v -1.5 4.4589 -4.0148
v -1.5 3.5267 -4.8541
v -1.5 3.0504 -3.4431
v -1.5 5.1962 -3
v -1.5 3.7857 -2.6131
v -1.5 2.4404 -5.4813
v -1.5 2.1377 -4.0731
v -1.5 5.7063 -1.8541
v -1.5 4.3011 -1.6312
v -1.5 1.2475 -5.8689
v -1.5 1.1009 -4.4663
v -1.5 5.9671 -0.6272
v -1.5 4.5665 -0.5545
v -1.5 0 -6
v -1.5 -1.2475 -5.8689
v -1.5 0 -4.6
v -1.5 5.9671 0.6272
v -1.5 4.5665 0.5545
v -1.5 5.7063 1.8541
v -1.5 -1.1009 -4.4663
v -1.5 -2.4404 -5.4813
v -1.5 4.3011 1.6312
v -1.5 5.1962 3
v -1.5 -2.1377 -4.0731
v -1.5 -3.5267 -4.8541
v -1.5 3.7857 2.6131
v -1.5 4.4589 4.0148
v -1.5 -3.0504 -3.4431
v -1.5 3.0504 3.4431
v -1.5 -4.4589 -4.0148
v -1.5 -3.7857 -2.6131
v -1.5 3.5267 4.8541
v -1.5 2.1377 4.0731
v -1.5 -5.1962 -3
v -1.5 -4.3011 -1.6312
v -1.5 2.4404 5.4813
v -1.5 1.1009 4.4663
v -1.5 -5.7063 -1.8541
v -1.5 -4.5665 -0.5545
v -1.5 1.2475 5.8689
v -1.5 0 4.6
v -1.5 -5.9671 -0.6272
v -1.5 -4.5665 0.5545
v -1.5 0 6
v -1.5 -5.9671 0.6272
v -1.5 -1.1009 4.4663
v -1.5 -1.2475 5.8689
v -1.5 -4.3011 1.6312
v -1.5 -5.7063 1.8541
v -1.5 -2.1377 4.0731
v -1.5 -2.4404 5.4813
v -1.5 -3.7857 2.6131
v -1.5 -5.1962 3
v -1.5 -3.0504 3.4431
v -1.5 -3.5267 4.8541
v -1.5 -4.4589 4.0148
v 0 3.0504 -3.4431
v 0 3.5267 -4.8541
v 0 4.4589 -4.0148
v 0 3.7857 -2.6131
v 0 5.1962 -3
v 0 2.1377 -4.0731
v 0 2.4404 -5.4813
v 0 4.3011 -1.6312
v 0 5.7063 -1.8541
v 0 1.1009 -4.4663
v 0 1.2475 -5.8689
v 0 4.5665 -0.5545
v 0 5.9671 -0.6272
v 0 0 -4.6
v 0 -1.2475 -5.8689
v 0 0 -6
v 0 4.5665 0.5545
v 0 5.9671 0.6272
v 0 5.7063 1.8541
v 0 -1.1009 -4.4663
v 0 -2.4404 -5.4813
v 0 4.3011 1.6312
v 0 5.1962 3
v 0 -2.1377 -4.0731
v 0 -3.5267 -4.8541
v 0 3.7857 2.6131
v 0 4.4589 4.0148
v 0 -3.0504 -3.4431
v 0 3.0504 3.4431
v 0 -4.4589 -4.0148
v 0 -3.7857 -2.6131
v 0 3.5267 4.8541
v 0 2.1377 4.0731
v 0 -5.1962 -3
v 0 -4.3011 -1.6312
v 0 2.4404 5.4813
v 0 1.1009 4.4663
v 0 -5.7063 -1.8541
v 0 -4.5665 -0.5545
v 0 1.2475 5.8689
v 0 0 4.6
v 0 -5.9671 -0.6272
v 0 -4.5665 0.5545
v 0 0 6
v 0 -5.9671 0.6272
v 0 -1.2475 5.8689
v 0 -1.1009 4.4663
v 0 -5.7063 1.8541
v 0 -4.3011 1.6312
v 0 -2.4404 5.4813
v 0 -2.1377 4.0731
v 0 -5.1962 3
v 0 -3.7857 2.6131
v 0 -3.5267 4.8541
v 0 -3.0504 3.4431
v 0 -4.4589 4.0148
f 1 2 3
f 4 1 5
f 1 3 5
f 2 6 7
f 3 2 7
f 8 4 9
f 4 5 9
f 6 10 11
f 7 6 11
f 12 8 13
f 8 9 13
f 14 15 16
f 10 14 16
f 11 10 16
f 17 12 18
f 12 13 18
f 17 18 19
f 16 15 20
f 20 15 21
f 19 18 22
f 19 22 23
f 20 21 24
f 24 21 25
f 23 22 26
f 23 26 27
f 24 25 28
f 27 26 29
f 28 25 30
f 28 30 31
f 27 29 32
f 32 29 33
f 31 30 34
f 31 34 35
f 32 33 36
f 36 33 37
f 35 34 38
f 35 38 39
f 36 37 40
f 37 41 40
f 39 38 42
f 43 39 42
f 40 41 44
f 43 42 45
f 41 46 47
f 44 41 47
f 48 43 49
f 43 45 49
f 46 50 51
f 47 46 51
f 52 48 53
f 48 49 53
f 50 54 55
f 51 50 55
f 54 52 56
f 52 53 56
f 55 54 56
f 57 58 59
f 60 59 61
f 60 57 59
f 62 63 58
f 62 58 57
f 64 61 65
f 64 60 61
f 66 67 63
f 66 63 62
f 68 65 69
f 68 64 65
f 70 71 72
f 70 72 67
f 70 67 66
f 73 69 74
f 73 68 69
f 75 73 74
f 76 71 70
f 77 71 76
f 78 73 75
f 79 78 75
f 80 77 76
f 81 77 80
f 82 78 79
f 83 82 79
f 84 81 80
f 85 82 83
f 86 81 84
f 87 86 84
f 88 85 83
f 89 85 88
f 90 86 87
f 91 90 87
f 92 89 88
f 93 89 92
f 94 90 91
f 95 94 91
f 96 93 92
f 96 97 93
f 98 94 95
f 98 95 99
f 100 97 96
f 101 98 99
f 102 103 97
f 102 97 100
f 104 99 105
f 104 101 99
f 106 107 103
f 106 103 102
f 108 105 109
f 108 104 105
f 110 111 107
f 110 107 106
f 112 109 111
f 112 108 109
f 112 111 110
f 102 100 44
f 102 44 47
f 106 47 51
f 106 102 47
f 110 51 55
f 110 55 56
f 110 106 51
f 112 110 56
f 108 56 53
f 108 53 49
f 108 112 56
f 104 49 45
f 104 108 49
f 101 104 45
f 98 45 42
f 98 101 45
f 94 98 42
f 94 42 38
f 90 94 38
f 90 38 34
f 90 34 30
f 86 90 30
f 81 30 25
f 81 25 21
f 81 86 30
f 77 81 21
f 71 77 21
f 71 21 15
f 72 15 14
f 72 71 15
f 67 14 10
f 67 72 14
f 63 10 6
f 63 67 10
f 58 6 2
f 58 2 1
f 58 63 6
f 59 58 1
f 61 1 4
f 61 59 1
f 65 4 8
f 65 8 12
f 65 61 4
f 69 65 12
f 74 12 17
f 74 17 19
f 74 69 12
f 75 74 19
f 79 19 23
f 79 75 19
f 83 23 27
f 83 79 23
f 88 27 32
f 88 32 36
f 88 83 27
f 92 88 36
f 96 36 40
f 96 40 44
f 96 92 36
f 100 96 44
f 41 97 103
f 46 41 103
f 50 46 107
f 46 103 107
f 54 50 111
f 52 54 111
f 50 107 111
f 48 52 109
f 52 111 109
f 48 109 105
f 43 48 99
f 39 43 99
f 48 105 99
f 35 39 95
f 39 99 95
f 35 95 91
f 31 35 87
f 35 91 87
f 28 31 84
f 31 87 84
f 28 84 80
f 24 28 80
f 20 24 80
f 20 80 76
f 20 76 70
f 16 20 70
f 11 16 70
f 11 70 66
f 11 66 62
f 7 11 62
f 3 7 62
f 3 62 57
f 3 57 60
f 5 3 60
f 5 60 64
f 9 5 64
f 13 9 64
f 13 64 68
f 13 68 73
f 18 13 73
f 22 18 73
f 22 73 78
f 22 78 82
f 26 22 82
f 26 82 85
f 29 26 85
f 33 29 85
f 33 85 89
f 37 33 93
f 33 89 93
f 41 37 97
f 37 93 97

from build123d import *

# Parameters (mm, degrees)
F0_R     = 6
F1_DEPTH = 1.5
F2_R     = 4.6
F3_DEPTH = 1.501
F4_ANGLE = 90
F6_ANGLE = 90


with BuildPart() as f1:
    # F0 (on Front) → F1 (new body)
    with BuildSketch(Plane.XZ):
        Circle(F0_R)
    extrude(amount=-F1_DEPTH)

    # F2 (on face) → F3 (cut, through all)
    with BuildSketch(Plane.XZ):
        Circle(F2_R)
    extrude(amount=-F3_DEPTH, mode=Mode.SUBTRACT)


with BuildPart() as f1_1:
    # F4: moved
    add(f1.part.rotate(Axis((0, 0, 0), (0, -1, 0)), F4_ANGLE))


with BuildPart() as f1_2:
    # F6: moved
    add(f1_1.part.rotate(Axis((0, 0, 0.289831), (0, 0, 1)), F6_ANGLE))


solid = f1_2.part
